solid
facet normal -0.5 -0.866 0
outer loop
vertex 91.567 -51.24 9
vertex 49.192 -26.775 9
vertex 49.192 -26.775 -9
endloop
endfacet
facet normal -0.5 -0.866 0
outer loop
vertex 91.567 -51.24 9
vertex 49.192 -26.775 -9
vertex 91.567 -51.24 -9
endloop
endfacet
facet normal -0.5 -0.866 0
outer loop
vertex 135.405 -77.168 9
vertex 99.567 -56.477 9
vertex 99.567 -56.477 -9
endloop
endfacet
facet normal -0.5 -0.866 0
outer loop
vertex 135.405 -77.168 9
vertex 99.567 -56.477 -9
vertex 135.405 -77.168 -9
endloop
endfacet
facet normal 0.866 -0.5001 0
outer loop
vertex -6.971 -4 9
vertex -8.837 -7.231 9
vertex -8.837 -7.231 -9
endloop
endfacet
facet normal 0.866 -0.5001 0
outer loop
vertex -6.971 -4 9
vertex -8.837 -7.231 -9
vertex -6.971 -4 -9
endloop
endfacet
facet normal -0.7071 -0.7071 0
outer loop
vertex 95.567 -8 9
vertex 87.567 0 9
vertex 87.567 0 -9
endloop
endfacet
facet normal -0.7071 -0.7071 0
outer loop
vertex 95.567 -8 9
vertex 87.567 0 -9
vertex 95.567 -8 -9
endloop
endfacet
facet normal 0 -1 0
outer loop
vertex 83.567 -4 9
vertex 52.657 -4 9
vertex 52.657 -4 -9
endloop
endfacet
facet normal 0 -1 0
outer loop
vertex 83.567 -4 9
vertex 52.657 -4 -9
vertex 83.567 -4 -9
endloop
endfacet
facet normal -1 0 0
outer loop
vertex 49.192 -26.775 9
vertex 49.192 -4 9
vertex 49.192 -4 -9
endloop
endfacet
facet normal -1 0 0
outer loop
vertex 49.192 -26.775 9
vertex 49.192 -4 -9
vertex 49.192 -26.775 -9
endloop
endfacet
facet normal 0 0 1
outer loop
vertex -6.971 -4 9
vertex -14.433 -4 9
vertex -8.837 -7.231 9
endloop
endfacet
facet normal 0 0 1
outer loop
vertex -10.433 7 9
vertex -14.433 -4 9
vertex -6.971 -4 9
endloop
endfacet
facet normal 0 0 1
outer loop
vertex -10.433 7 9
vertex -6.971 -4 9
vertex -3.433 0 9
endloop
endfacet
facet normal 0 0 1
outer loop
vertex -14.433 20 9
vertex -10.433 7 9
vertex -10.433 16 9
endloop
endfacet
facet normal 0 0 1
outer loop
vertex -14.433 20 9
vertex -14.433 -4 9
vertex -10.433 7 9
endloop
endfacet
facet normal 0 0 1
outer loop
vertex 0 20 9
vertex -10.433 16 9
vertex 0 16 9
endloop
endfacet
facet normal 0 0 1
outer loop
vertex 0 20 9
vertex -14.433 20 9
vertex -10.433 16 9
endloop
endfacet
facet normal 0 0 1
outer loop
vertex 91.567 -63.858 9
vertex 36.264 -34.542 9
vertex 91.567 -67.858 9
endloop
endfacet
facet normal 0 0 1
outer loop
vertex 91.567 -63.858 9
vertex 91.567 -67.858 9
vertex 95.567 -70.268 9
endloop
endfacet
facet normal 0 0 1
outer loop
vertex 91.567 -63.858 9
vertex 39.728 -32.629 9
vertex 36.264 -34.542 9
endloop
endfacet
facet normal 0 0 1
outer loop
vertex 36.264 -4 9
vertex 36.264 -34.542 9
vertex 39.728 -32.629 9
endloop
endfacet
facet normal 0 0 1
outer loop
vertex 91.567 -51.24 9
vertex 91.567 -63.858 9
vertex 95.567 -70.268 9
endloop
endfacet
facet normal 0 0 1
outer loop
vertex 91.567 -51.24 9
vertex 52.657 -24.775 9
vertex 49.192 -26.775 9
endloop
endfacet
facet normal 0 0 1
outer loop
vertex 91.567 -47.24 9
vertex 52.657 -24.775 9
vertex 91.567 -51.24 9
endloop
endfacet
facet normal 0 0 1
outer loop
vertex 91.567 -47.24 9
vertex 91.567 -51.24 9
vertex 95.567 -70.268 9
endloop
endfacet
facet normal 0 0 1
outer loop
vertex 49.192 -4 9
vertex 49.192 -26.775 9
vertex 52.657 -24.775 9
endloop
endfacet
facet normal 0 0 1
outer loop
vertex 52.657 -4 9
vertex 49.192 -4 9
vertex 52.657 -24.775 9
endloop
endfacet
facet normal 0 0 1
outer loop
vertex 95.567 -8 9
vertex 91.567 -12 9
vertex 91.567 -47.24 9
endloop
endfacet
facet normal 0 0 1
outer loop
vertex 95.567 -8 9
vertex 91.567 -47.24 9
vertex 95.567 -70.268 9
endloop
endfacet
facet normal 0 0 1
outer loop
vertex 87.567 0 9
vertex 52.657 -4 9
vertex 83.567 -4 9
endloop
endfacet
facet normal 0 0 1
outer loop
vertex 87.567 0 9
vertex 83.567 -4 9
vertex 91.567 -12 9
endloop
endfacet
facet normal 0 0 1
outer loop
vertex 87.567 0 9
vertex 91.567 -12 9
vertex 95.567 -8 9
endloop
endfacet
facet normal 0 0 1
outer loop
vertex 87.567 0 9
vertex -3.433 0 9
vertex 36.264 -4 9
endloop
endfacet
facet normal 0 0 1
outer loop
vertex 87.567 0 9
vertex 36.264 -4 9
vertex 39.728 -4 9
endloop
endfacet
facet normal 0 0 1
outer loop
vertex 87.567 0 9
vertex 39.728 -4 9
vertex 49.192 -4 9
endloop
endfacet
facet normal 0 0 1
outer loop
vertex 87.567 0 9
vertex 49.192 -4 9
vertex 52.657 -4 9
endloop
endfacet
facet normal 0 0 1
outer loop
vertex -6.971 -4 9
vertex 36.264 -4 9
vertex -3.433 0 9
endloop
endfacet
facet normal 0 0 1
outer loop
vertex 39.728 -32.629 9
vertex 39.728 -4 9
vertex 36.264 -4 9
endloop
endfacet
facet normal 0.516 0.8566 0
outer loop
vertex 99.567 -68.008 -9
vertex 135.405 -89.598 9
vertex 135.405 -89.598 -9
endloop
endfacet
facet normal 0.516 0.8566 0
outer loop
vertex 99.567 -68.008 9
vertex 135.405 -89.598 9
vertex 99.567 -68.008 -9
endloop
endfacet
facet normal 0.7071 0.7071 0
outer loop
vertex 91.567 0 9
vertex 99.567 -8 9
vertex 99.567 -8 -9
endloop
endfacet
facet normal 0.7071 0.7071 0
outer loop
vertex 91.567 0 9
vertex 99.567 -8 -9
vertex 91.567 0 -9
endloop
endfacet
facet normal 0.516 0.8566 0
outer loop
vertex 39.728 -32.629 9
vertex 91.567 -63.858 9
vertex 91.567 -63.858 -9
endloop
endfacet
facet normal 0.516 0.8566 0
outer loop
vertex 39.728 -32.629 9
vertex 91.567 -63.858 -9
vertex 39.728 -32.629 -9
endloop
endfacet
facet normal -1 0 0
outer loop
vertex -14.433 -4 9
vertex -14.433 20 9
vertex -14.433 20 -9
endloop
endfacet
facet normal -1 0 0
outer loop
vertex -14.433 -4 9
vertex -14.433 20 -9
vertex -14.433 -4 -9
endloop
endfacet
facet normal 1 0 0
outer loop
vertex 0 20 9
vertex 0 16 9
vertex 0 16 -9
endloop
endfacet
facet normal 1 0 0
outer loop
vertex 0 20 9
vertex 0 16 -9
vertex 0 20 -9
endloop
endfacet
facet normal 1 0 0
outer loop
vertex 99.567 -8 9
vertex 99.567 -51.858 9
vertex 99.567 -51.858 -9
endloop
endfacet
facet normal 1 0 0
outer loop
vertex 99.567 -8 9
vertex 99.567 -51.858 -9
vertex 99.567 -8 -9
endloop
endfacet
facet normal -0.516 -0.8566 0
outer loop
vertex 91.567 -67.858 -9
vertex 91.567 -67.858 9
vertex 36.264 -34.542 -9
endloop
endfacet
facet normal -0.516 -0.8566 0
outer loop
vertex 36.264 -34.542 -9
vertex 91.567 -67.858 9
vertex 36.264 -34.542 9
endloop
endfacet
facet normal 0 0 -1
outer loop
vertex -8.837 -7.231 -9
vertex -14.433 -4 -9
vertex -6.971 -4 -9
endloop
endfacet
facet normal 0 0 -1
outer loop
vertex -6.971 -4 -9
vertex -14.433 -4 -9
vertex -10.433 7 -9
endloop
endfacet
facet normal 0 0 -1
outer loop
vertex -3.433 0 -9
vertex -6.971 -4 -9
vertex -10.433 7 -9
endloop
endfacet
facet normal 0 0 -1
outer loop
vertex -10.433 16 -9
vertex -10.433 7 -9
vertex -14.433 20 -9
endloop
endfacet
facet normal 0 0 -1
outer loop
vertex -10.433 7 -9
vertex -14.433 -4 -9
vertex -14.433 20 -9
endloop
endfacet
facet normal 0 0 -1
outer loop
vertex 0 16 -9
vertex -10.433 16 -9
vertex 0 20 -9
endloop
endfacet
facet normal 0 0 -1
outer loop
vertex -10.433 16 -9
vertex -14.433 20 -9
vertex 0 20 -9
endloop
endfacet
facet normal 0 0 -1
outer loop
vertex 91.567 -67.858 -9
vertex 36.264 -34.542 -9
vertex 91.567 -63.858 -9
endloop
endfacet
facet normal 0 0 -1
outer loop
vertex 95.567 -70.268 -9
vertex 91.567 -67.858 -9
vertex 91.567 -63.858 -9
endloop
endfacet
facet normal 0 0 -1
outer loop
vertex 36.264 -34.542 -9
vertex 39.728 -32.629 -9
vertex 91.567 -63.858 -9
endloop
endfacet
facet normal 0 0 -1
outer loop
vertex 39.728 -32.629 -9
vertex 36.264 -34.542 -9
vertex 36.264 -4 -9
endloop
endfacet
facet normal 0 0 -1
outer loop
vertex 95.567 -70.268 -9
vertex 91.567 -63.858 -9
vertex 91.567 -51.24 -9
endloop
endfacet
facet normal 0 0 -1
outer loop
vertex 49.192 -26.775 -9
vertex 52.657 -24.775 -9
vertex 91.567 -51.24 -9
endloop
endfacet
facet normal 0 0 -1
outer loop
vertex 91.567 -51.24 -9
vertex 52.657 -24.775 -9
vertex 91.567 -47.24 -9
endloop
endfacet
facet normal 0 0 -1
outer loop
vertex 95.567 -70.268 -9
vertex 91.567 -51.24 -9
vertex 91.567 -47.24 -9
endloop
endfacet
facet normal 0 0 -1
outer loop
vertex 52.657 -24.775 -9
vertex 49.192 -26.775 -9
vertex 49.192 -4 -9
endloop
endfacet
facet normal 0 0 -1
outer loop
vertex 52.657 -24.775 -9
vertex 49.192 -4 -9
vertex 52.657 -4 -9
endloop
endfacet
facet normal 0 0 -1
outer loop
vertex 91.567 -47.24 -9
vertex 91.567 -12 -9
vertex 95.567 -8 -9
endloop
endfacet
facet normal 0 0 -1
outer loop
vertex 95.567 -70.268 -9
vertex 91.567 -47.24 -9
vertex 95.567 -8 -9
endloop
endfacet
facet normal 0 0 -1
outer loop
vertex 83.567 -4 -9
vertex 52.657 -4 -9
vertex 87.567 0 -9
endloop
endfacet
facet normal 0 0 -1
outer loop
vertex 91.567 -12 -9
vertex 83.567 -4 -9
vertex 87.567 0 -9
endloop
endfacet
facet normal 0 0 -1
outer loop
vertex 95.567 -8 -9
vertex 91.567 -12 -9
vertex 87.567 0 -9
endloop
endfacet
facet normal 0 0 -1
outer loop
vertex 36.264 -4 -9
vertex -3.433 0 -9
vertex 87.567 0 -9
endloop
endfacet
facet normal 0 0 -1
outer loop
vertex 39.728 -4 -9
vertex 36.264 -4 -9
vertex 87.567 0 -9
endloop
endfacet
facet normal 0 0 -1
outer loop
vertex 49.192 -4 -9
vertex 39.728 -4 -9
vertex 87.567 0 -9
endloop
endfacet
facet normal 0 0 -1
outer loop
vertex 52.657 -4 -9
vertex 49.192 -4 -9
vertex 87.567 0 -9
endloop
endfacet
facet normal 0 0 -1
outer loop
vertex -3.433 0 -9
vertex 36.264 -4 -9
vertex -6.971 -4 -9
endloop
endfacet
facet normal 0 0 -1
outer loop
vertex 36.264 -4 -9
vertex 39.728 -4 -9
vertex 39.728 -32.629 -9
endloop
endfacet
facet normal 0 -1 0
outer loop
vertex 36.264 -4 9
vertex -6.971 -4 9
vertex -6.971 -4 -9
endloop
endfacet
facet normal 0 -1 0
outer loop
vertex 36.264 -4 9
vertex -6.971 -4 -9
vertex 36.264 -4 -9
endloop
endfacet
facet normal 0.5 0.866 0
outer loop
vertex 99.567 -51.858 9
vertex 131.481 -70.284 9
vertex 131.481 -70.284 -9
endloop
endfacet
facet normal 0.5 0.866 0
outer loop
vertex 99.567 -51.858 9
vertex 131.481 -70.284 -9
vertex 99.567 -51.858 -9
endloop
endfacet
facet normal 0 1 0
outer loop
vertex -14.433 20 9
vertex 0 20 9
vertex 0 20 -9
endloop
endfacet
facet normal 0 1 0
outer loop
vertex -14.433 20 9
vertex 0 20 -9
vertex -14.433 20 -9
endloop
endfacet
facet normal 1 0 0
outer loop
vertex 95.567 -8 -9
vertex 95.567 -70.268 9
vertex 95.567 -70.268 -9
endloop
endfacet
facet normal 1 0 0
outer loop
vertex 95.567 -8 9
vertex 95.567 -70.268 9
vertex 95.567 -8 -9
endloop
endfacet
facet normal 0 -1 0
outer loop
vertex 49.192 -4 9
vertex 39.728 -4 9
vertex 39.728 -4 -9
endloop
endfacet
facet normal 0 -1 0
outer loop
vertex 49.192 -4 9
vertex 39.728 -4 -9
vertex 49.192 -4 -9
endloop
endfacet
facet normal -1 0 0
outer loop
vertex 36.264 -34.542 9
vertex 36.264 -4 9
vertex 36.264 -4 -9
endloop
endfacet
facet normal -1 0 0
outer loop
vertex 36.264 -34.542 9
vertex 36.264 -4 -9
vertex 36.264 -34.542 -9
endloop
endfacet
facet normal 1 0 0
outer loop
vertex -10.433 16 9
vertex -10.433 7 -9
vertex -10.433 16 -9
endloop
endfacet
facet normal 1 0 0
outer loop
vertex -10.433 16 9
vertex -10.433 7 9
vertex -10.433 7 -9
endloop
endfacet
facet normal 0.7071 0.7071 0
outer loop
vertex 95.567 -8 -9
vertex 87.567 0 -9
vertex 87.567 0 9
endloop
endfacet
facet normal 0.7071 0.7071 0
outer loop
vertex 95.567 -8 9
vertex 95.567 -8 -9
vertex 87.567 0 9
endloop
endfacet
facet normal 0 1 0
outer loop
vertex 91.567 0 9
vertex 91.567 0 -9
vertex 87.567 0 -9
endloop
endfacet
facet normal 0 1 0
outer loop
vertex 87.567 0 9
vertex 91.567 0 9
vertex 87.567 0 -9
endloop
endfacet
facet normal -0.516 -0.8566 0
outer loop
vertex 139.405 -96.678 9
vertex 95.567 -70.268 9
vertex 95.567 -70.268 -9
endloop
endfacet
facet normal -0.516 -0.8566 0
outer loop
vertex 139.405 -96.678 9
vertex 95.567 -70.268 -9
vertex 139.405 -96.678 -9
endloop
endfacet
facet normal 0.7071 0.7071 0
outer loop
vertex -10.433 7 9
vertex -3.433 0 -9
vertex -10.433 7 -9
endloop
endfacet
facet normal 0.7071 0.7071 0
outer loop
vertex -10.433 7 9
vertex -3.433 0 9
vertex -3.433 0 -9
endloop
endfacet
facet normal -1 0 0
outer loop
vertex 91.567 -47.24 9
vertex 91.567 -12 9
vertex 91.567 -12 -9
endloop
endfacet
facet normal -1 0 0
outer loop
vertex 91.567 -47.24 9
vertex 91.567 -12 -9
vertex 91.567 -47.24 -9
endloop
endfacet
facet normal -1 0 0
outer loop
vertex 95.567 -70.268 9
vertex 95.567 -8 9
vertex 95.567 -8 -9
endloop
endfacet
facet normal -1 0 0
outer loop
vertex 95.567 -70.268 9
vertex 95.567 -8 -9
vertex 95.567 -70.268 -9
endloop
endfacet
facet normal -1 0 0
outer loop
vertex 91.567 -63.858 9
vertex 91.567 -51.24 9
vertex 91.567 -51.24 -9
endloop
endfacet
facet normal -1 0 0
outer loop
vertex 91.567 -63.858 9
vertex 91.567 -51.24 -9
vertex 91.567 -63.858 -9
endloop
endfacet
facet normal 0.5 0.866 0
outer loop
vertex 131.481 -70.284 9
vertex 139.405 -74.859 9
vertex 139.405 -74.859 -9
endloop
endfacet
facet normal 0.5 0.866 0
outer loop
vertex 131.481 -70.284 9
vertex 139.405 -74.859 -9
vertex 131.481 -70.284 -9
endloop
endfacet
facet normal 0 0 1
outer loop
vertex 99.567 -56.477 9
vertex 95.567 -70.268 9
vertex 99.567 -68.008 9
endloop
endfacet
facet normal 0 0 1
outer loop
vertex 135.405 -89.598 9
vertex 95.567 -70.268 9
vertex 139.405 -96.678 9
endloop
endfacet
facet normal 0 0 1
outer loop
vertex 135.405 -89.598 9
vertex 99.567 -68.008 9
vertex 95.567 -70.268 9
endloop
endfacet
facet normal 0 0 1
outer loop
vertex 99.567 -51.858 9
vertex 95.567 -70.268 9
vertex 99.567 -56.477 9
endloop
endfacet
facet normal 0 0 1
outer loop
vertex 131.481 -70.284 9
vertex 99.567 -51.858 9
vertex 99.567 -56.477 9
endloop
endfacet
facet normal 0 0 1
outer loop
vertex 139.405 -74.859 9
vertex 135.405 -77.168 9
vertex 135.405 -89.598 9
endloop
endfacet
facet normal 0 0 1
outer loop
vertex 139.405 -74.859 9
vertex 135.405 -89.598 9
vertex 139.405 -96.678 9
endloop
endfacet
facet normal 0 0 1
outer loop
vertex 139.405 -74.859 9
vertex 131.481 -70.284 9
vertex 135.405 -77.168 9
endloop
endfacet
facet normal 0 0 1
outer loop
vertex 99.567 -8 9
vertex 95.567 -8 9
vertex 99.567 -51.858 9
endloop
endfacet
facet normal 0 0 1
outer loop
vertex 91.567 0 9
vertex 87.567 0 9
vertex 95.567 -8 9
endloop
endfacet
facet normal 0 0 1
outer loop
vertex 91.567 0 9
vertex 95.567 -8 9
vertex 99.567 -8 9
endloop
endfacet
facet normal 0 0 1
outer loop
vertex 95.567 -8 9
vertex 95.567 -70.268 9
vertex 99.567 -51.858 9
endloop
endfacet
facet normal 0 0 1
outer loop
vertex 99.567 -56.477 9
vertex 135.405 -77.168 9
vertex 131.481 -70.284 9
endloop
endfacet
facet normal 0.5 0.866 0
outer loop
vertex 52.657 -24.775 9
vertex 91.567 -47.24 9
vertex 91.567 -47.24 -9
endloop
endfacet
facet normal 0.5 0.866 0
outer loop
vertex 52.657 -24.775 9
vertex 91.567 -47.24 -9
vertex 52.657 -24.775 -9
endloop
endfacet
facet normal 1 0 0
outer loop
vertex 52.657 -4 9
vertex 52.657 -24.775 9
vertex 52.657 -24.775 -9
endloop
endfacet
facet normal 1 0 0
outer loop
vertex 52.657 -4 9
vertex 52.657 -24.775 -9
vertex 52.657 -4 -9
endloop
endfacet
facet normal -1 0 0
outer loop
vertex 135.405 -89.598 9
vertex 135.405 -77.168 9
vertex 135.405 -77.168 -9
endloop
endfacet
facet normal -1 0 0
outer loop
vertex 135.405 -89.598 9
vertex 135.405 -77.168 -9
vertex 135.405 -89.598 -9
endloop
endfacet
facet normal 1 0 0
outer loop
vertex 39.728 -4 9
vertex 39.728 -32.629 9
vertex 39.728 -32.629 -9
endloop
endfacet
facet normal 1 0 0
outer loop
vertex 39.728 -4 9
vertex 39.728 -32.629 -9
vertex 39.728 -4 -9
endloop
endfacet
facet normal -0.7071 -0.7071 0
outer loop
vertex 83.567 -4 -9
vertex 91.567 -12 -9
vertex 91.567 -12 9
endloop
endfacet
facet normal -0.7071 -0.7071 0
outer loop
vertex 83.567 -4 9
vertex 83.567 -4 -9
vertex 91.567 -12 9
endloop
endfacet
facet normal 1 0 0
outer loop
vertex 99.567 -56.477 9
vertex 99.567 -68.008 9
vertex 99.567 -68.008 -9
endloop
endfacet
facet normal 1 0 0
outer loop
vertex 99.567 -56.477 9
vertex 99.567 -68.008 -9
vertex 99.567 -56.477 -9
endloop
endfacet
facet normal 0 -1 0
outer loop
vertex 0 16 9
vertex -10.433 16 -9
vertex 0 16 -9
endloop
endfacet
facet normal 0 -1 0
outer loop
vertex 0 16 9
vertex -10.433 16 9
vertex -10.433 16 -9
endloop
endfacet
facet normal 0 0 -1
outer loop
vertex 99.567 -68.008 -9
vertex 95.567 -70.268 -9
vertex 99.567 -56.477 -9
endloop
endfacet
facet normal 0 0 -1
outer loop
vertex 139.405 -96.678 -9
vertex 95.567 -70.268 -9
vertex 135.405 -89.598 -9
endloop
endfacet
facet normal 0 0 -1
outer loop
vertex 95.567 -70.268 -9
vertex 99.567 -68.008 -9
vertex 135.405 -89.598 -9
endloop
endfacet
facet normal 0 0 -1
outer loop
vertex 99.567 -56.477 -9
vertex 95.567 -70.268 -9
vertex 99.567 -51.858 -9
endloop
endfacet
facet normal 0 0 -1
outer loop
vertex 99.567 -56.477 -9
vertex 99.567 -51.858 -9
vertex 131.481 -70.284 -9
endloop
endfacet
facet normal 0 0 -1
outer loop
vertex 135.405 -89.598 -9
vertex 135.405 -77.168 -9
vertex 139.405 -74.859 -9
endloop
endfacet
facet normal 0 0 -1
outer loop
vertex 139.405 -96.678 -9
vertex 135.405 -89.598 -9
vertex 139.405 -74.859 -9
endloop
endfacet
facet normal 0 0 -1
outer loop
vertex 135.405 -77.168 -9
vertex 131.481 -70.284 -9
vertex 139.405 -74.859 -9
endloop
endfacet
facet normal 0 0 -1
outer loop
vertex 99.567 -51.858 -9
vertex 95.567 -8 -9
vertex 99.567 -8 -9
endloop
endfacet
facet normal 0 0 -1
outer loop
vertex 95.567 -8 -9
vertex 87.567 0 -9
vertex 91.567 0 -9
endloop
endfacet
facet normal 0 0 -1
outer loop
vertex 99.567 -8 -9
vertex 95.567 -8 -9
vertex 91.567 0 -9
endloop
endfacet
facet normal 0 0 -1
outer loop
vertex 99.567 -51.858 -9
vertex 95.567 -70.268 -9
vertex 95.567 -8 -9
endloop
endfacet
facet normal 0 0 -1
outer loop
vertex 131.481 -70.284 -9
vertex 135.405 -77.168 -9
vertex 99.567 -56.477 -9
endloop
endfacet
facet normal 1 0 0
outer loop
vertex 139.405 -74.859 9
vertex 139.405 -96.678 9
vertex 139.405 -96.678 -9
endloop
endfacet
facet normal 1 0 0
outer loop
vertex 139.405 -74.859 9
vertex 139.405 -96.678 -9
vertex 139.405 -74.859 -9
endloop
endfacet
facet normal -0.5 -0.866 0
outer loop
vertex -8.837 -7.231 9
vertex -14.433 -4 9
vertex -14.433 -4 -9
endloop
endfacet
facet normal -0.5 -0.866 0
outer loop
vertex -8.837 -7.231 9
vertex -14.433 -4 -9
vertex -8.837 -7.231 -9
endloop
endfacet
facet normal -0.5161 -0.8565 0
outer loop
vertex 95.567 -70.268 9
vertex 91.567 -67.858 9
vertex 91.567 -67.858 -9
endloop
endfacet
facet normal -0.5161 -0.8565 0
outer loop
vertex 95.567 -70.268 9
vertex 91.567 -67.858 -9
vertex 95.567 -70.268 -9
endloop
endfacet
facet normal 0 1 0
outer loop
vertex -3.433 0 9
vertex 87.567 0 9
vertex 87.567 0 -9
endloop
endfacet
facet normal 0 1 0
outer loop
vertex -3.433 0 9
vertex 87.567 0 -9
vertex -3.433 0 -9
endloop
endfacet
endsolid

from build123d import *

# Parameters (mm, degrees)
F1_DEPTH  = 9
F3_DEPTH  = 25
F5_DEPTH  = 18
F7_DEPTH  = 18
F8_SIZE   = 8
F9_SIZE   = 8
F11_DEPTH = 25
F13_DEPTH = 18
F15_DEPTH = 25
F17_DEPTH = 18
F19_DEPTH = 18


with BuildPart() as f1:
    # F0 (on Top) → F1 (new body, symmetric)
    with BuildSketch(Plane.XY):
        Polygon((-10.432638064, 16), (0, 16), (0, 20), (-14.432638064, 20), (-14.432638064, -4), (91.567361936, -4), (95.567361936, -4), (95.567361936, 0), (-3.432638064, 0), (-10.432638064, 0), (-10.432638064, 7), align=None)
        Polygon((-3.432638064, 0), (-10.432638064, 7), (-10.432638064, 0), align=None)
        Polygon((95.567361936, -4), (91.567361936, -4), (91.567361936, -67.8584948182), (95.567361936, -70.2682493397), align=None)
    extrude(amount=F1_DEPTH, both=True)

    # F2 (on face) → F3 (cut)
    with BuildSketch(Plane.XY.offset(9)):
        Polygon((-43.0447869003, -70.2682493397), (95.567361936, -70.2682493397), (-14.432638064, -4), (-43.0447869003, -4), align=None)
    extrude(amount=-F3_DEPTH, mode=Mode.SUBTRACT)

    # F4 (on face) → F5 (join)
    with BuildSketch(Plane.XY.offset(9)):
        Polygon((36.264283176, -35.9292474091), (91.567361936, -67.8584948182), (146.870440696, -35.9292474091), (146.870440696, 27.9292474091), (91.567361936, 59.8584948182), (36.264283176, 27.9292474091), align=None)
        Polygon((143.4063390808, -33.9292474091), (91.567361936, -63.8584948182), (39.7283847911, -33.9292474091), (39.7283847911, 25.9292474091), (91.567361936, 55.8584948182), (143.4063390808, 25.9292474091), align=None, mode=Mode.SUBTRACT)
    extrude(amount=-F5_DEPTH)

    # F6 (on face) → F7 (join)
    with BuildSketch(Plane.XY.offset(9)):
        Polygon((49.1924864062, -26.7745468707), (95.567361936, -53.5490937415), (141.9422374657, -26.7745468707), (141.9422374657, 26.7745468707), (95.567361936, 53.5490937415), (49.1924864062, 26.7745468707), align=None)
        Polygon((138.4781358506, -24.7745468707), (95.567361936, -49.5490937415), (52.6565880214, -24.7745468707), (52.6565880214, 24.7745468707), (95.567361936, 49.5490937415), (138.4781358506, 24.7745468707), align=None, mode=Mode.SUBTRACT)
    extrude(amount=-F7_DEPTH)

    # F8
    f8_edges = [f1.edges().sort_by_distance(p)[0] for p in [
        (91.567362, -4, 0),
    ]]
    chamfer(f8_edges, length=F8_SIZE)

    # F9
    f9_edges = [f1.edges().sort_by_distance(p)[0] for p in [
        (95.567362, 0, 0),
    ]]
    chamfer(f9_edges, length=F9_SIZE)

    # F10 (on face) → F11 (cut)
    with BuildSketch(Plane.XY.offset(9)):
        Polygon((24.8906668276, 40.9471578896), (28.4933988005, 0), (95.567361936, 0), (95.567361936, -73.1679201126), (150.7629007101, -38.6447645724), (155.2586406469, 64.3327608705), (108.4874495864, 79.6543508768), align=None)
    extrude(amount=-F11_DEPTH, mode=Mode.SUBTRACT)

    # F12 (on face) → F13 (join)
    with BuildSketch(Plane.XY.offset(9)):
        Polygon((-6.9714882909, -4), (-14.432638064, -4), (-8.8367757342, -7.2307726225), align=None)
    extrude(amount=-F13_DEPTH)

    # F14 (on face) → F15 (cut)
    with BuildSketch(Plane.XY.offset(9)):
        Polygon((95.567361936, -70.2682493397), (-14.432638064, -4), (-31.3558727503, -4), (95.567361936, -79.2363807559), align=None)
    extrude(amount=-F15_DEPTH, mode=Mode.SUBTRACT)

    # F16 (on face) → F17 (join)
    with BuildSketch(Plane.XY.offset(9)):
        Polygon((91.567361936, -67.8584948182), (91.567361936, -63.8584948182), (39.7283847911, -32.6286924278), (36.264283176, -34.5417837953), align=None)
    extrude(amount=-F17_DEPTH)


with BuildPart() as f19:
    # F18 (on face) → F19 (new body)
    with BuildSketch(Plane.XY.offset(9)):
        Polygon((95.567361936, -65.5984616728), (95.567361936, -70.2682493397), (139.4050659721, -96.6777757173), (139.4050659721, -92.0079880504), (135.4050659721, -89.598233529), (99.567361936, -68.0082161942), align=None)
        Polygon((95.567361936, -54.167895895), (95.567361936, -65.5984616728), (99.567361936, -68.0082161942), (99.567361936, -56.4772969717), align=None)
        Polygon((135.4050659721, -89.598233529), (139.4050659721, -92.0079880504), (139.4050659721, -79.4776061209), (135.4050659721, -77.1682050441), align=None)
        Polygon((95.567361936, -49.5490937415), (95.567361936, -54.167895895), (99.567361936, -56.4772969717), (99.567361936, -51.8584948182), align=None)
        Polygon((135.4050659721, -77.1682050441), (139.4050659721, -79.4776061209), (139.4050659721, -74.8588039673), (131.4809072449, -70.2837887931), (99.567361936, -51.8584948182), (99.567361936, -56.4772969717), align=None)
        Polygon((95.567361936, -8), (95.567361936, -49.5490937415), (99.567361936, -51.8584948182), (99.567361936, -8), (91.567361936, 0), (87.567361936, 0), align=None)
    extrude(amount=-F19_DEPTH)


solid = Compound([f1.part, f19.part])
